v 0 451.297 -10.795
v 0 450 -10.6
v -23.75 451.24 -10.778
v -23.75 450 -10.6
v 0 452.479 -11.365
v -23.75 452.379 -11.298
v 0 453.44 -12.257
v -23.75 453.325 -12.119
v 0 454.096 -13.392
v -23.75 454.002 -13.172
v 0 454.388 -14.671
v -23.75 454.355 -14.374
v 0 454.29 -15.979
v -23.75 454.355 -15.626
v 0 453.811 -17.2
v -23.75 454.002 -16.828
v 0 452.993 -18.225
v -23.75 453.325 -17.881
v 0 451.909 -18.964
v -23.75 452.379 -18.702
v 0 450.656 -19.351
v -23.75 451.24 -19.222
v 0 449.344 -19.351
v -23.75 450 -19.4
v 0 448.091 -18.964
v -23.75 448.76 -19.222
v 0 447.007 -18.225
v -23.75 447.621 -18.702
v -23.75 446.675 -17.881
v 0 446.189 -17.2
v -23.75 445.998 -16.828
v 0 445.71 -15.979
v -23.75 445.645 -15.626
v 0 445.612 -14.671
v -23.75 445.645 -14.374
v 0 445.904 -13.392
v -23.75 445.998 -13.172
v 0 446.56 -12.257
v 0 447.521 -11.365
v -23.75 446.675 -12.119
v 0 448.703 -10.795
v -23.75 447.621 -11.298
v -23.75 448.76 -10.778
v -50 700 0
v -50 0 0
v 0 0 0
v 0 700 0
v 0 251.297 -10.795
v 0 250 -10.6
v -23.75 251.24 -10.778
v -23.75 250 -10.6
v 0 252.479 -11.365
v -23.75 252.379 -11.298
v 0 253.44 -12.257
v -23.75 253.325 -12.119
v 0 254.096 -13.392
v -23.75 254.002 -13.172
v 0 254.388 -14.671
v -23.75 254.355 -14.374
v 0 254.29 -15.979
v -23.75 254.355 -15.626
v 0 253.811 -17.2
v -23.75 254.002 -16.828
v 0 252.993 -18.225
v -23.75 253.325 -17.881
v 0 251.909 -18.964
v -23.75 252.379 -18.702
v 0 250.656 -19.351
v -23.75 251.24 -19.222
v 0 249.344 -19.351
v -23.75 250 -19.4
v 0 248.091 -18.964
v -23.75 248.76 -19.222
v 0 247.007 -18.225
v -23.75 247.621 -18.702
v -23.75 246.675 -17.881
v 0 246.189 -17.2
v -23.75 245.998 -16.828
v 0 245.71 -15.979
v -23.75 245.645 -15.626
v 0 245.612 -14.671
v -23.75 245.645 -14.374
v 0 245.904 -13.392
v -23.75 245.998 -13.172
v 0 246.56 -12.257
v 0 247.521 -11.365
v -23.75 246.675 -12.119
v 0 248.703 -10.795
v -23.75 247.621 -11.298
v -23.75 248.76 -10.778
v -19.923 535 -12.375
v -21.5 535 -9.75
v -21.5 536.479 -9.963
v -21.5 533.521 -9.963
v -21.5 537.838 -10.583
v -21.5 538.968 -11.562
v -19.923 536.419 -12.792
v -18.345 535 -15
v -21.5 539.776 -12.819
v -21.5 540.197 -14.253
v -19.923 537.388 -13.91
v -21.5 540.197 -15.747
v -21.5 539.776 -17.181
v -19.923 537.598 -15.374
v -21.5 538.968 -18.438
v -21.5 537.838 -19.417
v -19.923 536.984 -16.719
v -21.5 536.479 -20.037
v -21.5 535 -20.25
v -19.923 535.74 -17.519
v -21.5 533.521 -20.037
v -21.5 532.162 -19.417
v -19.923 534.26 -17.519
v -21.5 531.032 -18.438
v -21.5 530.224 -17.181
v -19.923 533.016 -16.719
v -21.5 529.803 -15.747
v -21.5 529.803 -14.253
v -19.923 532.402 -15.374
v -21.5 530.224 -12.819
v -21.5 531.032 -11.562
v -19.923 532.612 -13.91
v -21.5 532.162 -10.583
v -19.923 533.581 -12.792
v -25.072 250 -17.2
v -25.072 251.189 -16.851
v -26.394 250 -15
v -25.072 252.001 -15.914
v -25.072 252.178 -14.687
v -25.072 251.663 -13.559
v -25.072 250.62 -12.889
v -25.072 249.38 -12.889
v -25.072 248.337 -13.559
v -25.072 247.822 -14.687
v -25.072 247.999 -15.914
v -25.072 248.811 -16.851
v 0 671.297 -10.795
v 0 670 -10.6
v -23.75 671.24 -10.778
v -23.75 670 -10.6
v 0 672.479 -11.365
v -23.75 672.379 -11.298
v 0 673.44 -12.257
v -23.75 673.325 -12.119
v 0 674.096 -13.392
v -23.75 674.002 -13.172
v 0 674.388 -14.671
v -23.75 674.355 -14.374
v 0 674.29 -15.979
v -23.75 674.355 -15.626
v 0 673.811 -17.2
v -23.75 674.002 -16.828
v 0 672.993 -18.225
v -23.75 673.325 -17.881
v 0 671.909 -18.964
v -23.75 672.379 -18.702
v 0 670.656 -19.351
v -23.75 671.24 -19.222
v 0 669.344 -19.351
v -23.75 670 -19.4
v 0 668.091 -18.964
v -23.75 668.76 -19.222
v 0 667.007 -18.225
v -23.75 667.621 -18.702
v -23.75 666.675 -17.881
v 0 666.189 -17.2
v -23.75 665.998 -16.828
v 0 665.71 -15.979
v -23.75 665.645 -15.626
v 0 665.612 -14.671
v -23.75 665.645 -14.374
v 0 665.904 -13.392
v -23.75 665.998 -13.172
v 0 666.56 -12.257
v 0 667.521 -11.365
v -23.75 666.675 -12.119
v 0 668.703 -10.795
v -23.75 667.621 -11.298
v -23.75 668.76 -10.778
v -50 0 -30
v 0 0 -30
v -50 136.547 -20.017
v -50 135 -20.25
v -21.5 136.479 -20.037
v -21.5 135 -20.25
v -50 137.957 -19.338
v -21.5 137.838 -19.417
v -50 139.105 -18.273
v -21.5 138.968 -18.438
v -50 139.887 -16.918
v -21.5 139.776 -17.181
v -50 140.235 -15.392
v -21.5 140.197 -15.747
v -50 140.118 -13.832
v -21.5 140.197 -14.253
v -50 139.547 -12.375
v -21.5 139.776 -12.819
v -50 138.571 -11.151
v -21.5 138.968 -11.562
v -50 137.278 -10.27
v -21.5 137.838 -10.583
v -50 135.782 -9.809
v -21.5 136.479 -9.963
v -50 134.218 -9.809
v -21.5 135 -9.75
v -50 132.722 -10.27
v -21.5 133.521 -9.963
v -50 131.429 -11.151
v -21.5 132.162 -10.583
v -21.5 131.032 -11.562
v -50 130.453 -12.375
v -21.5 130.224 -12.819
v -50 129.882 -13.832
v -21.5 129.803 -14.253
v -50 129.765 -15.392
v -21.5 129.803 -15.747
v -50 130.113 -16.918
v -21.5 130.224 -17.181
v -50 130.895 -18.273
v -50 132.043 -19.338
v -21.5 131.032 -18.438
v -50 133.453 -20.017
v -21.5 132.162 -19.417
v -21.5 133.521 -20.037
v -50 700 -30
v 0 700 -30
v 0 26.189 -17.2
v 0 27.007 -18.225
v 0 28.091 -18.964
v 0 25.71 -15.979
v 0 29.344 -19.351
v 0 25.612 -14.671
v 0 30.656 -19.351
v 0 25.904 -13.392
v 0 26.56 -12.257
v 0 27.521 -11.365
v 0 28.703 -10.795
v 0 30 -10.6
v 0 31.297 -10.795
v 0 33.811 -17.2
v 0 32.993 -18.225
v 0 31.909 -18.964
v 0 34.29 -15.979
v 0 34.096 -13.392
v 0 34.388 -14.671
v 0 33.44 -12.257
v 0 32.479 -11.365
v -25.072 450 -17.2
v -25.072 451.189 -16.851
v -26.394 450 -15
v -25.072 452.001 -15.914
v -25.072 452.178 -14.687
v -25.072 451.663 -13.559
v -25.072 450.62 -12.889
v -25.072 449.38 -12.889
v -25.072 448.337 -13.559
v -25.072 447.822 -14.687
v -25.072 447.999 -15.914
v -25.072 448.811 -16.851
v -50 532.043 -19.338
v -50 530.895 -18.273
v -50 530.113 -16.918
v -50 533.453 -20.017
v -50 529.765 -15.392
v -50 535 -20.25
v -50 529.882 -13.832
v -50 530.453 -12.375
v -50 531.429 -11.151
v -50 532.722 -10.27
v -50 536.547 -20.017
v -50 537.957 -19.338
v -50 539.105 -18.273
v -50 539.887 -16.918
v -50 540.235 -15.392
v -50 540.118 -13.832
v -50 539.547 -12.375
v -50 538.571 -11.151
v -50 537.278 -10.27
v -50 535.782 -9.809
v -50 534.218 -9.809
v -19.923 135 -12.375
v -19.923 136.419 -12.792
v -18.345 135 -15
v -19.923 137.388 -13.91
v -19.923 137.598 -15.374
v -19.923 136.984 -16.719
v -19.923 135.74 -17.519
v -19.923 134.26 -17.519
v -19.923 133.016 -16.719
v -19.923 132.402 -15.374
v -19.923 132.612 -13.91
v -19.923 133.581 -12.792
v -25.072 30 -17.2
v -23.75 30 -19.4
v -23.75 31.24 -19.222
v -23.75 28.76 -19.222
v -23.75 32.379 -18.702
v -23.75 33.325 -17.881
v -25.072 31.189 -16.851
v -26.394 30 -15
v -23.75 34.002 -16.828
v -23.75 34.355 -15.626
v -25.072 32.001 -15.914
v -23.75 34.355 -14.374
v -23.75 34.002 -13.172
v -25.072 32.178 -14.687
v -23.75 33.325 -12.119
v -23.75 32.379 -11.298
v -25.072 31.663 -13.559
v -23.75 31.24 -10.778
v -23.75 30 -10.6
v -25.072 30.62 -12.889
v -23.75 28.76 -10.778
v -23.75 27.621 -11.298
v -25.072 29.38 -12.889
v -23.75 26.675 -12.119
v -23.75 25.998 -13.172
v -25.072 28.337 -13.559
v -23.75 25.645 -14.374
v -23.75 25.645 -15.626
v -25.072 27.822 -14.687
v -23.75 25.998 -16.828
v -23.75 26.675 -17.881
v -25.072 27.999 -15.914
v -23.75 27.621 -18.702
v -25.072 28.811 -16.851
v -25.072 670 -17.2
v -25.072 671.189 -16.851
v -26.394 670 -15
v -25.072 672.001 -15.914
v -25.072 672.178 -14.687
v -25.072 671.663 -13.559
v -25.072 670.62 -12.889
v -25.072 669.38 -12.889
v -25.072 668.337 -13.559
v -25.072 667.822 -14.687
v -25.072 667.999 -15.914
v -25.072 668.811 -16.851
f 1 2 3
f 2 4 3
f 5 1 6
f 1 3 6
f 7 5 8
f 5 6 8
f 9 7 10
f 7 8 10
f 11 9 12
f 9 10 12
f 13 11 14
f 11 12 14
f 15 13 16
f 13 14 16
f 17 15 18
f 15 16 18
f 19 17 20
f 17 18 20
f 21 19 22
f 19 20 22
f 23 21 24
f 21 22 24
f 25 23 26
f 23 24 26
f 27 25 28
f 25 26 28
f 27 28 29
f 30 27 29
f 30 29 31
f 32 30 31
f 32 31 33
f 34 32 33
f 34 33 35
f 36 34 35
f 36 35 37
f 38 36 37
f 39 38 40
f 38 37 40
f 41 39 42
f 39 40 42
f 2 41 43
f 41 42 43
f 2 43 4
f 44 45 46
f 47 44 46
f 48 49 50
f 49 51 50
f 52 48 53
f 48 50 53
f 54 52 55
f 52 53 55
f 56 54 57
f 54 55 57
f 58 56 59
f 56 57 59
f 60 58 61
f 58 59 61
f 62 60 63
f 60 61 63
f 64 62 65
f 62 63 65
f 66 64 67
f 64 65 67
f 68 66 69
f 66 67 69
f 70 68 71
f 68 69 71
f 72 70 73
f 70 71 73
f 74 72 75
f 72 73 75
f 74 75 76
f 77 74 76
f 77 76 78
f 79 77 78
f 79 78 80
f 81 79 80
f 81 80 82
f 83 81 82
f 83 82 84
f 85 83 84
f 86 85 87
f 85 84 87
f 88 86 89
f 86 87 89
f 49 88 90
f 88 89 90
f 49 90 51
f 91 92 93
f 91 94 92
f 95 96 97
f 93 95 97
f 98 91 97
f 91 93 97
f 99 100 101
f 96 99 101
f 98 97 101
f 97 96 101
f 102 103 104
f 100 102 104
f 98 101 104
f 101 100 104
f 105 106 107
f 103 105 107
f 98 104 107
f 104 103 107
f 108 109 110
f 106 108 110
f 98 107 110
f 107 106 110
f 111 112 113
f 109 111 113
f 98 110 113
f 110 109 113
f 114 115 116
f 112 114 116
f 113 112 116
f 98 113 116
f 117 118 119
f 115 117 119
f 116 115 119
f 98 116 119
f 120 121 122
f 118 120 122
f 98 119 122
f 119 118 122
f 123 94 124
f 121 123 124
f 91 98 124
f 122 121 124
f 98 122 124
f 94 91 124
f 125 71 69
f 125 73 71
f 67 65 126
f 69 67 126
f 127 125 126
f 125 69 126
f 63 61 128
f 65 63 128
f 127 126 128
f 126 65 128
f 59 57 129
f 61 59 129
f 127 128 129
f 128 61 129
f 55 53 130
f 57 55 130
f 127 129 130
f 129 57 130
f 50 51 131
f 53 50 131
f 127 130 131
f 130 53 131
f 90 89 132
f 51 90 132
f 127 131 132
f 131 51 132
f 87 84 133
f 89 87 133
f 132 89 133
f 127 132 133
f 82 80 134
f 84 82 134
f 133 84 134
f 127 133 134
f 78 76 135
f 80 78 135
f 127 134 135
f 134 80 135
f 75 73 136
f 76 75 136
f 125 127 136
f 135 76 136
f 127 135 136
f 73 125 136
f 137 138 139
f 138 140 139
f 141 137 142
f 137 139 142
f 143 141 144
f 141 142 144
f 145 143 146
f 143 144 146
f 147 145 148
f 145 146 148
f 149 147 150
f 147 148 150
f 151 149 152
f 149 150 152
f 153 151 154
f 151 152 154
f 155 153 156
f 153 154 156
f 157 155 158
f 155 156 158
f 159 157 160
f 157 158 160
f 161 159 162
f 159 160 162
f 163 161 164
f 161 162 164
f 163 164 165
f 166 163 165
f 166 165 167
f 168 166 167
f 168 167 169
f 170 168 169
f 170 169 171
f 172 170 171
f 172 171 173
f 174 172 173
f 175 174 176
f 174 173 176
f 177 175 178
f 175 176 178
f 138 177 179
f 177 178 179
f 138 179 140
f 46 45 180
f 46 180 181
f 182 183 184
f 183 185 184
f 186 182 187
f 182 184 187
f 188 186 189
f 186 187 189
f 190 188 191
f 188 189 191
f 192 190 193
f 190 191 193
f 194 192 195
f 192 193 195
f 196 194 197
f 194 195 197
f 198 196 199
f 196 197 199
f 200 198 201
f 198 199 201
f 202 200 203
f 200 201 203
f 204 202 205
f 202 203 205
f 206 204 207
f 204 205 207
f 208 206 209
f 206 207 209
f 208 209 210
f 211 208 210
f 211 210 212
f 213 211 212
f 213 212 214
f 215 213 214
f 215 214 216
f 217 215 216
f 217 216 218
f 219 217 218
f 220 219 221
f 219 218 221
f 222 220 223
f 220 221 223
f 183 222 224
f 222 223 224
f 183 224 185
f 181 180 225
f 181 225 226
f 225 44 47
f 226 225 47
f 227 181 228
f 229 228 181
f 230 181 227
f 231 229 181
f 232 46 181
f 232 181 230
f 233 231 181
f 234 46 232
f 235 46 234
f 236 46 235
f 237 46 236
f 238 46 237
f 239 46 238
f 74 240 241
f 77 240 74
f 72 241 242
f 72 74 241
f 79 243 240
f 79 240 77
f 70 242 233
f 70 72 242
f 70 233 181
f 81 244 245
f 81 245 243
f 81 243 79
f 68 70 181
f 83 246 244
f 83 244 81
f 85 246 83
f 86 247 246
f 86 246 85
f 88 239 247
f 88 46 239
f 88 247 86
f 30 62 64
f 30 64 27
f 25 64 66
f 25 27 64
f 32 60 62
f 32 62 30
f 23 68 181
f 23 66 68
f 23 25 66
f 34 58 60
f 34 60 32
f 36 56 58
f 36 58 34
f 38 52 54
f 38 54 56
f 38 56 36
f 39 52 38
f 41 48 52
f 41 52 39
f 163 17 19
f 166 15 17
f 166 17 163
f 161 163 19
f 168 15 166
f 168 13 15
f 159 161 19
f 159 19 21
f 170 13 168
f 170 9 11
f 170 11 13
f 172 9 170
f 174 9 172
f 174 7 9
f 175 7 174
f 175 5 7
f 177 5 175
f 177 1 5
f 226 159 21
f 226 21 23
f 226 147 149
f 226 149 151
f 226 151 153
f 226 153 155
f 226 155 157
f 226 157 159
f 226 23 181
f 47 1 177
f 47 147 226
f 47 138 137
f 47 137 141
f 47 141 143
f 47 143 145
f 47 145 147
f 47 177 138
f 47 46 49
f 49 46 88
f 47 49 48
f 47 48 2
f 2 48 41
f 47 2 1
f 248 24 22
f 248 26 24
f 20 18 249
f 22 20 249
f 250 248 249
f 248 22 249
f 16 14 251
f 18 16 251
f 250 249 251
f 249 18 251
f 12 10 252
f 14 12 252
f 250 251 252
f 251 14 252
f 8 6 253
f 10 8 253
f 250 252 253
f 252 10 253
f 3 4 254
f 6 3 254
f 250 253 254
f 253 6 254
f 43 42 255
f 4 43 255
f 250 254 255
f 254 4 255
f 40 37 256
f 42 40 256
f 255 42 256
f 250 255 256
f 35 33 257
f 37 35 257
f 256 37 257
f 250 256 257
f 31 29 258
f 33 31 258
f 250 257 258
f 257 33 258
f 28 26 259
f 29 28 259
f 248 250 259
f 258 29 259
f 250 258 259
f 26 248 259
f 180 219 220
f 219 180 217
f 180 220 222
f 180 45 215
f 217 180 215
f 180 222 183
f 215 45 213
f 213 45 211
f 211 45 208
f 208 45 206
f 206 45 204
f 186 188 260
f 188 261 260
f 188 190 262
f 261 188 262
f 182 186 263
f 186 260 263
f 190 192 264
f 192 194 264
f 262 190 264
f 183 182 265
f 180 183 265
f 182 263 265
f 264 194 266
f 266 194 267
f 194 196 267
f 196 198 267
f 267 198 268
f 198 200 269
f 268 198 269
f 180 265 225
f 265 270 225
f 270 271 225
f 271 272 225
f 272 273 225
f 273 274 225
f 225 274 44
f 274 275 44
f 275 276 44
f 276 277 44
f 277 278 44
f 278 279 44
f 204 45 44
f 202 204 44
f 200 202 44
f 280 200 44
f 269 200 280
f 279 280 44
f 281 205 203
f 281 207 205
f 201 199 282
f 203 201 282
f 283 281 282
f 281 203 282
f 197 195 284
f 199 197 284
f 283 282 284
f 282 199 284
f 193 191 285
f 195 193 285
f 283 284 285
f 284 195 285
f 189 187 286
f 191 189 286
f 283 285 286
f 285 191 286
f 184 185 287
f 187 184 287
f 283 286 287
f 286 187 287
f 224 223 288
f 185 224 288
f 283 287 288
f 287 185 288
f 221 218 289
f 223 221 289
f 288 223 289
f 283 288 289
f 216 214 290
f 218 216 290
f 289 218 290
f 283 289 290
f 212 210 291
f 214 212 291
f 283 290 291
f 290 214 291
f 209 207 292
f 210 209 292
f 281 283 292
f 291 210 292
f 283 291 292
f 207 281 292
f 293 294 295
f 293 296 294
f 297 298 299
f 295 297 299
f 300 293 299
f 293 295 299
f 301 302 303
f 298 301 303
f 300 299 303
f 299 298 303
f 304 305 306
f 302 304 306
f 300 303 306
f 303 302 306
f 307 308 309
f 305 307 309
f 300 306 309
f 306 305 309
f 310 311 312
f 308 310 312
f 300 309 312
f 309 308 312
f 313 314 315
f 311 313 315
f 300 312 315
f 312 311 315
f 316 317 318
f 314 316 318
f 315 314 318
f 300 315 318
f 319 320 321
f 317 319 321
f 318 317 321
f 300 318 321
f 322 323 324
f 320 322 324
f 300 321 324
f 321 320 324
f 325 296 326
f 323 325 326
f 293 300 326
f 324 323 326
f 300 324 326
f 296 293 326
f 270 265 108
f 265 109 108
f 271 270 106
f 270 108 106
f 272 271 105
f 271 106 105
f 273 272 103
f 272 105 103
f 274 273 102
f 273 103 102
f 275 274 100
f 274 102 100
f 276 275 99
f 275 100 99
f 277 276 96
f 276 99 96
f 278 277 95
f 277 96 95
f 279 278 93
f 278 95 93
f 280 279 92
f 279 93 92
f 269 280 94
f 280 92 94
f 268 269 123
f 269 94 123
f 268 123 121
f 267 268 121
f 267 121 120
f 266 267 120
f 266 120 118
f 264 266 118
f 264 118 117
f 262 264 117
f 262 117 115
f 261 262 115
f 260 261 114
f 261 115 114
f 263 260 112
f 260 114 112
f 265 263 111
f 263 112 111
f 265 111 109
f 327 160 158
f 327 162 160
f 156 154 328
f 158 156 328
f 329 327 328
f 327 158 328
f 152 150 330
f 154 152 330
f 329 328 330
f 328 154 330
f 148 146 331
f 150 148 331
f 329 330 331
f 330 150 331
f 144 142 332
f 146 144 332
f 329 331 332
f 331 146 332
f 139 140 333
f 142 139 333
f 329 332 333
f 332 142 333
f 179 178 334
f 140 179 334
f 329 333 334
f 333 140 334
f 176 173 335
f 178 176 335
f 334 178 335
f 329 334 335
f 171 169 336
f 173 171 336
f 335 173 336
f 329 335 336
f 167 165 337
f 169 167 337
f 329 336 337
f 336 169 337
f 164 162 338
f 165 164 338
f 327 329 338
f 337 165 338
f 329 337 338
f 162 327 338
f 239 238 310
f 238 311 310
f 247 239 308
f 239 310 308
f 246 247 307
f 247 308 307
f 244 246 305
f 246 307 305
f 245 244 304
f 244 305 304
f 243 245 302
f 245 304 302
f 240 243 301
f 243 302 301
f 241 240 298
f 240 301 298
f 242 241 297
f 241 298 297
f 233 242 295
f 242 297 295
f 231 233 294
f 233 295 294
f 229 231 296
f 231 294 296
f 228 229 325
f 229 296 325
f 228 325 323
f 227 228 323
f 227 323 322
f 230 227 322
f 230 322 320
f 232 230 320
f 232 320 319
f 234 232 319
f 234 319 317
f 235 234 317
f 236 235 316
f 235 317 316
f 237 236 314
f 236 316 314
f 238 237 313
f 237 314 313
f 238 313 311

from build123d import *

# Parameters (mm, degrees)
SKETCH_1_W       = 50
SKETCH_1_H       = 700
EXTRUDE_1_DEPTH  = 30
M10X1_25_1_D     = 8.8
M10X1_25_1_DEPTH = 23.75
M10X1_25_1_TIP   = 2.643786724
M12X1_5_1_D      = 10.5
M12X1_5_1_DEPTH  = 28.5
M12X1_5_1_TIP    = 3.15451825


with BuildPart() as part:
    # 草图1 → 凸台-拉伸1 (new body)
    with BuildSketch(Plane.XY):
        with Locations((-25, 350)):
            Rectangle(SKETCH_1_W, SKETCH_1_H)
    extrude(amount=-EXTRUDE_1_DEPTH)

    # M10x1.25 螺纹孔1
    with Locations(Plane(origin=(0, 0, 0), x_dir=(0, 0, -1), z_dir=(1, 0, 0))):
        with Locations((15, 670), (15, 450), (15, 250), (15, 30)):
            Hole(M10X1_25_1_D / 2, depth=M10X1_25_1_DEPTH)
            with Locations((0, 0, -(M10X1_25_1_DEPTH + M10X1_25_1_TIP / 2))):  # 118° drill point
                Cone(0, M10X1_25_1_D / 2, M10X1_25_1_TIP, mode=Mode.SUBTRACT)

    # M12x1.5 螺纹孔1
    with Locations(Plane.ZY.offset(50)):
        with Locations((-15, 535), (-15, 135)):
            Hole(M12X1_5_1_D / 2, depth=M12X1_5_1_DEPTH)
            with Locations((0, 0, -(M12X1_5_1_DEPTH + M12X1_5_1_TIP / 2))):  # 118° drill point
                Cone(0, M12X1_5_1_D / 2, M12X1_5_1_TIP, mode=Mode.SUBTRACT)


solid = part.part
